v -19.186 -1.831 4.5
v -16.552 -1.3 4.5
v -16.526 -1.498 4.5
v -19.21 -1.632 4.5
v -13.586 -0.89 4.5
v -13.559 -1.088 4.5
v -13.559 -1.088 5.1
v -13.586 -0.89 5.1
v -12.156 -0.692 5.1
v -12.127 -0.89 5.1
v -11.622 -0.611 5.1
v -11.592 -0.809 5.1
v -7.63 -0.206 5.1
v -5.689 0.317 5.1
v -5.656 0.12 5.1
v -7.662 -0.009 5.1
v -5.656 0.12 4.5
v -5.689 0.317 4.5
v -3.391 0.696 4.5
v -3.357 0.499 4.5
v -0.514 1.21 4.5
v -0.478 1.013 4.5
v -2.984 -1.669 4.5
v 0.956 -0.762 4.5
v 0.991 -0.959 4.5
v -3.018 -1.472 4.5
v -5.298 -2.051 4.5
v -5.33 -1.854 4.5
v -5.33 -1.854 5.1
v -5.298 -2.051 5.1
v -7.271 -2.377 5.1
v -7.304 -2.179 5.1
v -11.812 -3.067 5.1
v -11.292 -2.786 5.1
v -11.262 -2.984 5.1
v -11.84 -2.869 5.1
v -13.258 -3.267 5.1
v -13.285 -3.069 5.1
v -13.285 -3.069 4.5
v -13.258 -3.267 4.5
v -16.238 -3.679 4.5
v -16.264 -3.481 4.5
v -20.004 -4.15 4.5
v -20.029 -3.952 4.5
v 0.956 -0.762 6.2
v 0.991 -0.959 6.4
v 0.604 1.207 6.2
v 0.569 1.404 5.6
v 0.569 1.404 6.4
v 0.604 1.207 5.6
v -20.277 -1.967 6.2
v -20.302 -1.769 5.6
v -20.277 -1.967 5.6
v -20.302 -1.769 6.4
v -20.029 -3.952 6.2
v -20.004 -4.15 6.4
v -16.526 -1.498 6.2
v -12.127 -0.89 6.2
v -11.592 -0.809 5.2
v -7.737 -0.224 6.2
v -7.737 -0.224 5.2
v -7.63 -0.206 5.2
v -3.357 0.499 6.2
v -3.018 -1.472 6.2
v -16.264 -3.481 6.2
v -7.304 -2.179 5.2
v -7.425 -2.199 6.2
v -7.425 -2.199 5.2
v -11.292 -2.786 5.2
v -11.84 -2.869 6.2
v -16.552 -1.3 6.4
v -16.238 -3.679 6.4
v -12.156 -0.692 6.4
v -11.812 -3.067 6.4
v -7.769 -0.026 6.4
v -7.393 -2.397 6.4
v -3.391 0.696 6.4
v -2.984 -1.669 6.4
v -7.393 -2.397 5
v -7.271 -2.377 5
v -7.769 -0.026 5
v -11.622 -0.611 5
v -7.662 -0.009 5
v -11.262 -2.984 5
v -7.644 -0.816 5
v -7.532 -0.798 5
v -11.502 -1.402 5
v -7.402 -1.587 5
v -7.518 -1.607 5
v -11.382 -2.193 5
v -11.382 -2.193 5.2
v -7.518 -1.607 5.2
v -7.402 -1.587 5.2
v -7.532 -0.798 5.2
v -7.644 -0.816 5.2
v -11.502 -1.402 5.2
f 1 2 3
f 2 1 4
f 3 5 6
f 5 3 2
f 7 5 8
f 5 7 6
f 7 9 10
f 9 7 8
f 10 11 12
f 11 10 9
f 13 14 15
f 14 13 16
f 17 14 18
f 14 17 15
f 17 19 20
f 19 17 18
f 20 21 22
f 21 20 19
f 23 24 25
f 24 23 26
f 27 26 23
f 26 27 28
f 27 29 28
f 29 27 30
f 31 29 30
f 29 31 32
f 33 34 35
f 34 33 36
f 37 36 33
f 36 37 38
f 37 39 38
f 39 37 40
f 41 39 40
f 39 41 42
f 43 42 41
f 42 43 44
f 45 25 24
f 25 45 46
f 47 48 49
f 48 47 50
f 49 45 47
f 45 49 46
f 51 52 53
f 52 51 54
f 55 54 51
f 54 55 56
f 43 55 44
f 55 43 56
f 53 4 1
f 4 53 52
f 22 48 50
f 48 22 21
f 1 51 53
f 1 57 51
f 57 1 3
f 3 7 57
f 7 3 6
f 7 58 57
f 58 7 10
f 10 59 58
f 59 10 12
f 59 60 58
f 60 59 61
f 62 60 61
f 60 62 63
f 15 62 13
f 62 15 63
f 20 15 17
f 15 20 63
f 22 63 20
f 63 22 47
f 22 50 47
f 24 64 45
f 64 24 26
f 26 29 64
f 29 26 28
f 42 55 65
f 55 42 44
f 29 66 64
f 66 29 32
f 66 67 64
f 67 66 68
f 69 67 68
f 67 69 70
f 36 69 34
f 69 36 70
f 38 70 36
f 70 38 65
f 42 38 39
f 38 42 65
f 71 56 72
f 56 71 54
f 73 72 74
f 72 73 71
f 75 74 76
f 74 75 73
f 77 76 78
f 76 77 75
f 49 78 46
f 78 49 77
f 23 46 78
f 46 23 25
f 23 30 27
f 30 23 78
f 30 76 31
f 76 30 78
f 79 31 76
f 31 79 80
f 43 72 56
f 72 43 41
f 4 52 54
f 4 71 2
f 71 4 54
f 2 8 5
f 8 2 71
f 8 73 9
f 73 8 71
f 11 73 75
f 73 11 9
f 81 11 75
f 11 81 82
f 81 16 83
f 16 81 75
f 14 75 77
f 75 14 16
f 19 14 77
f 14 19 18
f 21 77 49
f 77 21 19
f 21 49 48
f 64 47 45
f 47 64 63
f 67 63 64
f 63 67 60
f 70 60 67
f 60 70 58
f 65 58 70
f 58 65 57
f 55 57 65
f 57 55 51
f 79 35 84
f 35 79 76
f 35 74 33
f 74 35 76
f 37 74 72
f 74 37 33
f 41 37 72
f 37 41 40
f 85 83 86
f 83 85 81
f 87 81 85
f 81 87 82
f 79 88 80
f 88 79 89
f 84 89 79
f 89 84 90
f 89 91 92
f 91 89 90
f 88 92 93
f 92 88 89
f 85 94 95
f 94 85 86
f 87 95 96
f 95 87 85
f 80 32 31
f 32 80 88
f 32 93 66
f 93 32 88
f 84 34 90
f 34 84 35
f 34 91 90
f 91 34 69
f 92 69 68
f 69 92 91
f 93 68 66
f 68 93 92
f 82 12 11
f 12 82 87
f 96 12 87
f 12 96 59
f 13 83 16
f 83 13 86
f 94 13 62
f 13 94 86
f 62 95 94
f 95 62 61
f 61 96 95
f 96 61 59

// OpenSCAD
use <../lib.scad>
use <u9240.scad>
function ldraw_lib__u9545() = [
// 0 ~Train Track 9V Switch Tongue Left - Metal Rail
// 0 Name: u9545.dat
// 0 Author: Max Martin Richter [MMR1988]
// 0 !LDRAW_ORG Part UPDATE 2025-08
// 0 !LICENSE Licensed under CC BY 4.0 : see CAreadme.txt
// 
// 0 BFC CERTIFY CCW
  [0,"BFC","CERTIFY"],
  [0,"BFC","CCW"],
// 
// 0 !HISTORY 2024-12-31 [MMR1988] Rewritten from scratch, original by KROACH
// 0 !HISTORY 2025-08-31 [OrionP] Official Update 2025-08
// 
// 1 16 0 0 0 1 0 0 0 1 0 0 0 -1 u9240.dat
  [1,16,0,0,0,1,0,0,0,1,0,0,0,-1, ldraw_lib__u9240()],
];
module ldraw_lib__u9545(step=0, col=false, unit=2/5, alt=false, line=0.2, solid=!$preview)
    makepoly(ldraw_lib__u9545(), step=step, col=col, unit=unit, alt=alt, line=line, solid=solid);
ldraw_lib__u9545(line=0.2);
